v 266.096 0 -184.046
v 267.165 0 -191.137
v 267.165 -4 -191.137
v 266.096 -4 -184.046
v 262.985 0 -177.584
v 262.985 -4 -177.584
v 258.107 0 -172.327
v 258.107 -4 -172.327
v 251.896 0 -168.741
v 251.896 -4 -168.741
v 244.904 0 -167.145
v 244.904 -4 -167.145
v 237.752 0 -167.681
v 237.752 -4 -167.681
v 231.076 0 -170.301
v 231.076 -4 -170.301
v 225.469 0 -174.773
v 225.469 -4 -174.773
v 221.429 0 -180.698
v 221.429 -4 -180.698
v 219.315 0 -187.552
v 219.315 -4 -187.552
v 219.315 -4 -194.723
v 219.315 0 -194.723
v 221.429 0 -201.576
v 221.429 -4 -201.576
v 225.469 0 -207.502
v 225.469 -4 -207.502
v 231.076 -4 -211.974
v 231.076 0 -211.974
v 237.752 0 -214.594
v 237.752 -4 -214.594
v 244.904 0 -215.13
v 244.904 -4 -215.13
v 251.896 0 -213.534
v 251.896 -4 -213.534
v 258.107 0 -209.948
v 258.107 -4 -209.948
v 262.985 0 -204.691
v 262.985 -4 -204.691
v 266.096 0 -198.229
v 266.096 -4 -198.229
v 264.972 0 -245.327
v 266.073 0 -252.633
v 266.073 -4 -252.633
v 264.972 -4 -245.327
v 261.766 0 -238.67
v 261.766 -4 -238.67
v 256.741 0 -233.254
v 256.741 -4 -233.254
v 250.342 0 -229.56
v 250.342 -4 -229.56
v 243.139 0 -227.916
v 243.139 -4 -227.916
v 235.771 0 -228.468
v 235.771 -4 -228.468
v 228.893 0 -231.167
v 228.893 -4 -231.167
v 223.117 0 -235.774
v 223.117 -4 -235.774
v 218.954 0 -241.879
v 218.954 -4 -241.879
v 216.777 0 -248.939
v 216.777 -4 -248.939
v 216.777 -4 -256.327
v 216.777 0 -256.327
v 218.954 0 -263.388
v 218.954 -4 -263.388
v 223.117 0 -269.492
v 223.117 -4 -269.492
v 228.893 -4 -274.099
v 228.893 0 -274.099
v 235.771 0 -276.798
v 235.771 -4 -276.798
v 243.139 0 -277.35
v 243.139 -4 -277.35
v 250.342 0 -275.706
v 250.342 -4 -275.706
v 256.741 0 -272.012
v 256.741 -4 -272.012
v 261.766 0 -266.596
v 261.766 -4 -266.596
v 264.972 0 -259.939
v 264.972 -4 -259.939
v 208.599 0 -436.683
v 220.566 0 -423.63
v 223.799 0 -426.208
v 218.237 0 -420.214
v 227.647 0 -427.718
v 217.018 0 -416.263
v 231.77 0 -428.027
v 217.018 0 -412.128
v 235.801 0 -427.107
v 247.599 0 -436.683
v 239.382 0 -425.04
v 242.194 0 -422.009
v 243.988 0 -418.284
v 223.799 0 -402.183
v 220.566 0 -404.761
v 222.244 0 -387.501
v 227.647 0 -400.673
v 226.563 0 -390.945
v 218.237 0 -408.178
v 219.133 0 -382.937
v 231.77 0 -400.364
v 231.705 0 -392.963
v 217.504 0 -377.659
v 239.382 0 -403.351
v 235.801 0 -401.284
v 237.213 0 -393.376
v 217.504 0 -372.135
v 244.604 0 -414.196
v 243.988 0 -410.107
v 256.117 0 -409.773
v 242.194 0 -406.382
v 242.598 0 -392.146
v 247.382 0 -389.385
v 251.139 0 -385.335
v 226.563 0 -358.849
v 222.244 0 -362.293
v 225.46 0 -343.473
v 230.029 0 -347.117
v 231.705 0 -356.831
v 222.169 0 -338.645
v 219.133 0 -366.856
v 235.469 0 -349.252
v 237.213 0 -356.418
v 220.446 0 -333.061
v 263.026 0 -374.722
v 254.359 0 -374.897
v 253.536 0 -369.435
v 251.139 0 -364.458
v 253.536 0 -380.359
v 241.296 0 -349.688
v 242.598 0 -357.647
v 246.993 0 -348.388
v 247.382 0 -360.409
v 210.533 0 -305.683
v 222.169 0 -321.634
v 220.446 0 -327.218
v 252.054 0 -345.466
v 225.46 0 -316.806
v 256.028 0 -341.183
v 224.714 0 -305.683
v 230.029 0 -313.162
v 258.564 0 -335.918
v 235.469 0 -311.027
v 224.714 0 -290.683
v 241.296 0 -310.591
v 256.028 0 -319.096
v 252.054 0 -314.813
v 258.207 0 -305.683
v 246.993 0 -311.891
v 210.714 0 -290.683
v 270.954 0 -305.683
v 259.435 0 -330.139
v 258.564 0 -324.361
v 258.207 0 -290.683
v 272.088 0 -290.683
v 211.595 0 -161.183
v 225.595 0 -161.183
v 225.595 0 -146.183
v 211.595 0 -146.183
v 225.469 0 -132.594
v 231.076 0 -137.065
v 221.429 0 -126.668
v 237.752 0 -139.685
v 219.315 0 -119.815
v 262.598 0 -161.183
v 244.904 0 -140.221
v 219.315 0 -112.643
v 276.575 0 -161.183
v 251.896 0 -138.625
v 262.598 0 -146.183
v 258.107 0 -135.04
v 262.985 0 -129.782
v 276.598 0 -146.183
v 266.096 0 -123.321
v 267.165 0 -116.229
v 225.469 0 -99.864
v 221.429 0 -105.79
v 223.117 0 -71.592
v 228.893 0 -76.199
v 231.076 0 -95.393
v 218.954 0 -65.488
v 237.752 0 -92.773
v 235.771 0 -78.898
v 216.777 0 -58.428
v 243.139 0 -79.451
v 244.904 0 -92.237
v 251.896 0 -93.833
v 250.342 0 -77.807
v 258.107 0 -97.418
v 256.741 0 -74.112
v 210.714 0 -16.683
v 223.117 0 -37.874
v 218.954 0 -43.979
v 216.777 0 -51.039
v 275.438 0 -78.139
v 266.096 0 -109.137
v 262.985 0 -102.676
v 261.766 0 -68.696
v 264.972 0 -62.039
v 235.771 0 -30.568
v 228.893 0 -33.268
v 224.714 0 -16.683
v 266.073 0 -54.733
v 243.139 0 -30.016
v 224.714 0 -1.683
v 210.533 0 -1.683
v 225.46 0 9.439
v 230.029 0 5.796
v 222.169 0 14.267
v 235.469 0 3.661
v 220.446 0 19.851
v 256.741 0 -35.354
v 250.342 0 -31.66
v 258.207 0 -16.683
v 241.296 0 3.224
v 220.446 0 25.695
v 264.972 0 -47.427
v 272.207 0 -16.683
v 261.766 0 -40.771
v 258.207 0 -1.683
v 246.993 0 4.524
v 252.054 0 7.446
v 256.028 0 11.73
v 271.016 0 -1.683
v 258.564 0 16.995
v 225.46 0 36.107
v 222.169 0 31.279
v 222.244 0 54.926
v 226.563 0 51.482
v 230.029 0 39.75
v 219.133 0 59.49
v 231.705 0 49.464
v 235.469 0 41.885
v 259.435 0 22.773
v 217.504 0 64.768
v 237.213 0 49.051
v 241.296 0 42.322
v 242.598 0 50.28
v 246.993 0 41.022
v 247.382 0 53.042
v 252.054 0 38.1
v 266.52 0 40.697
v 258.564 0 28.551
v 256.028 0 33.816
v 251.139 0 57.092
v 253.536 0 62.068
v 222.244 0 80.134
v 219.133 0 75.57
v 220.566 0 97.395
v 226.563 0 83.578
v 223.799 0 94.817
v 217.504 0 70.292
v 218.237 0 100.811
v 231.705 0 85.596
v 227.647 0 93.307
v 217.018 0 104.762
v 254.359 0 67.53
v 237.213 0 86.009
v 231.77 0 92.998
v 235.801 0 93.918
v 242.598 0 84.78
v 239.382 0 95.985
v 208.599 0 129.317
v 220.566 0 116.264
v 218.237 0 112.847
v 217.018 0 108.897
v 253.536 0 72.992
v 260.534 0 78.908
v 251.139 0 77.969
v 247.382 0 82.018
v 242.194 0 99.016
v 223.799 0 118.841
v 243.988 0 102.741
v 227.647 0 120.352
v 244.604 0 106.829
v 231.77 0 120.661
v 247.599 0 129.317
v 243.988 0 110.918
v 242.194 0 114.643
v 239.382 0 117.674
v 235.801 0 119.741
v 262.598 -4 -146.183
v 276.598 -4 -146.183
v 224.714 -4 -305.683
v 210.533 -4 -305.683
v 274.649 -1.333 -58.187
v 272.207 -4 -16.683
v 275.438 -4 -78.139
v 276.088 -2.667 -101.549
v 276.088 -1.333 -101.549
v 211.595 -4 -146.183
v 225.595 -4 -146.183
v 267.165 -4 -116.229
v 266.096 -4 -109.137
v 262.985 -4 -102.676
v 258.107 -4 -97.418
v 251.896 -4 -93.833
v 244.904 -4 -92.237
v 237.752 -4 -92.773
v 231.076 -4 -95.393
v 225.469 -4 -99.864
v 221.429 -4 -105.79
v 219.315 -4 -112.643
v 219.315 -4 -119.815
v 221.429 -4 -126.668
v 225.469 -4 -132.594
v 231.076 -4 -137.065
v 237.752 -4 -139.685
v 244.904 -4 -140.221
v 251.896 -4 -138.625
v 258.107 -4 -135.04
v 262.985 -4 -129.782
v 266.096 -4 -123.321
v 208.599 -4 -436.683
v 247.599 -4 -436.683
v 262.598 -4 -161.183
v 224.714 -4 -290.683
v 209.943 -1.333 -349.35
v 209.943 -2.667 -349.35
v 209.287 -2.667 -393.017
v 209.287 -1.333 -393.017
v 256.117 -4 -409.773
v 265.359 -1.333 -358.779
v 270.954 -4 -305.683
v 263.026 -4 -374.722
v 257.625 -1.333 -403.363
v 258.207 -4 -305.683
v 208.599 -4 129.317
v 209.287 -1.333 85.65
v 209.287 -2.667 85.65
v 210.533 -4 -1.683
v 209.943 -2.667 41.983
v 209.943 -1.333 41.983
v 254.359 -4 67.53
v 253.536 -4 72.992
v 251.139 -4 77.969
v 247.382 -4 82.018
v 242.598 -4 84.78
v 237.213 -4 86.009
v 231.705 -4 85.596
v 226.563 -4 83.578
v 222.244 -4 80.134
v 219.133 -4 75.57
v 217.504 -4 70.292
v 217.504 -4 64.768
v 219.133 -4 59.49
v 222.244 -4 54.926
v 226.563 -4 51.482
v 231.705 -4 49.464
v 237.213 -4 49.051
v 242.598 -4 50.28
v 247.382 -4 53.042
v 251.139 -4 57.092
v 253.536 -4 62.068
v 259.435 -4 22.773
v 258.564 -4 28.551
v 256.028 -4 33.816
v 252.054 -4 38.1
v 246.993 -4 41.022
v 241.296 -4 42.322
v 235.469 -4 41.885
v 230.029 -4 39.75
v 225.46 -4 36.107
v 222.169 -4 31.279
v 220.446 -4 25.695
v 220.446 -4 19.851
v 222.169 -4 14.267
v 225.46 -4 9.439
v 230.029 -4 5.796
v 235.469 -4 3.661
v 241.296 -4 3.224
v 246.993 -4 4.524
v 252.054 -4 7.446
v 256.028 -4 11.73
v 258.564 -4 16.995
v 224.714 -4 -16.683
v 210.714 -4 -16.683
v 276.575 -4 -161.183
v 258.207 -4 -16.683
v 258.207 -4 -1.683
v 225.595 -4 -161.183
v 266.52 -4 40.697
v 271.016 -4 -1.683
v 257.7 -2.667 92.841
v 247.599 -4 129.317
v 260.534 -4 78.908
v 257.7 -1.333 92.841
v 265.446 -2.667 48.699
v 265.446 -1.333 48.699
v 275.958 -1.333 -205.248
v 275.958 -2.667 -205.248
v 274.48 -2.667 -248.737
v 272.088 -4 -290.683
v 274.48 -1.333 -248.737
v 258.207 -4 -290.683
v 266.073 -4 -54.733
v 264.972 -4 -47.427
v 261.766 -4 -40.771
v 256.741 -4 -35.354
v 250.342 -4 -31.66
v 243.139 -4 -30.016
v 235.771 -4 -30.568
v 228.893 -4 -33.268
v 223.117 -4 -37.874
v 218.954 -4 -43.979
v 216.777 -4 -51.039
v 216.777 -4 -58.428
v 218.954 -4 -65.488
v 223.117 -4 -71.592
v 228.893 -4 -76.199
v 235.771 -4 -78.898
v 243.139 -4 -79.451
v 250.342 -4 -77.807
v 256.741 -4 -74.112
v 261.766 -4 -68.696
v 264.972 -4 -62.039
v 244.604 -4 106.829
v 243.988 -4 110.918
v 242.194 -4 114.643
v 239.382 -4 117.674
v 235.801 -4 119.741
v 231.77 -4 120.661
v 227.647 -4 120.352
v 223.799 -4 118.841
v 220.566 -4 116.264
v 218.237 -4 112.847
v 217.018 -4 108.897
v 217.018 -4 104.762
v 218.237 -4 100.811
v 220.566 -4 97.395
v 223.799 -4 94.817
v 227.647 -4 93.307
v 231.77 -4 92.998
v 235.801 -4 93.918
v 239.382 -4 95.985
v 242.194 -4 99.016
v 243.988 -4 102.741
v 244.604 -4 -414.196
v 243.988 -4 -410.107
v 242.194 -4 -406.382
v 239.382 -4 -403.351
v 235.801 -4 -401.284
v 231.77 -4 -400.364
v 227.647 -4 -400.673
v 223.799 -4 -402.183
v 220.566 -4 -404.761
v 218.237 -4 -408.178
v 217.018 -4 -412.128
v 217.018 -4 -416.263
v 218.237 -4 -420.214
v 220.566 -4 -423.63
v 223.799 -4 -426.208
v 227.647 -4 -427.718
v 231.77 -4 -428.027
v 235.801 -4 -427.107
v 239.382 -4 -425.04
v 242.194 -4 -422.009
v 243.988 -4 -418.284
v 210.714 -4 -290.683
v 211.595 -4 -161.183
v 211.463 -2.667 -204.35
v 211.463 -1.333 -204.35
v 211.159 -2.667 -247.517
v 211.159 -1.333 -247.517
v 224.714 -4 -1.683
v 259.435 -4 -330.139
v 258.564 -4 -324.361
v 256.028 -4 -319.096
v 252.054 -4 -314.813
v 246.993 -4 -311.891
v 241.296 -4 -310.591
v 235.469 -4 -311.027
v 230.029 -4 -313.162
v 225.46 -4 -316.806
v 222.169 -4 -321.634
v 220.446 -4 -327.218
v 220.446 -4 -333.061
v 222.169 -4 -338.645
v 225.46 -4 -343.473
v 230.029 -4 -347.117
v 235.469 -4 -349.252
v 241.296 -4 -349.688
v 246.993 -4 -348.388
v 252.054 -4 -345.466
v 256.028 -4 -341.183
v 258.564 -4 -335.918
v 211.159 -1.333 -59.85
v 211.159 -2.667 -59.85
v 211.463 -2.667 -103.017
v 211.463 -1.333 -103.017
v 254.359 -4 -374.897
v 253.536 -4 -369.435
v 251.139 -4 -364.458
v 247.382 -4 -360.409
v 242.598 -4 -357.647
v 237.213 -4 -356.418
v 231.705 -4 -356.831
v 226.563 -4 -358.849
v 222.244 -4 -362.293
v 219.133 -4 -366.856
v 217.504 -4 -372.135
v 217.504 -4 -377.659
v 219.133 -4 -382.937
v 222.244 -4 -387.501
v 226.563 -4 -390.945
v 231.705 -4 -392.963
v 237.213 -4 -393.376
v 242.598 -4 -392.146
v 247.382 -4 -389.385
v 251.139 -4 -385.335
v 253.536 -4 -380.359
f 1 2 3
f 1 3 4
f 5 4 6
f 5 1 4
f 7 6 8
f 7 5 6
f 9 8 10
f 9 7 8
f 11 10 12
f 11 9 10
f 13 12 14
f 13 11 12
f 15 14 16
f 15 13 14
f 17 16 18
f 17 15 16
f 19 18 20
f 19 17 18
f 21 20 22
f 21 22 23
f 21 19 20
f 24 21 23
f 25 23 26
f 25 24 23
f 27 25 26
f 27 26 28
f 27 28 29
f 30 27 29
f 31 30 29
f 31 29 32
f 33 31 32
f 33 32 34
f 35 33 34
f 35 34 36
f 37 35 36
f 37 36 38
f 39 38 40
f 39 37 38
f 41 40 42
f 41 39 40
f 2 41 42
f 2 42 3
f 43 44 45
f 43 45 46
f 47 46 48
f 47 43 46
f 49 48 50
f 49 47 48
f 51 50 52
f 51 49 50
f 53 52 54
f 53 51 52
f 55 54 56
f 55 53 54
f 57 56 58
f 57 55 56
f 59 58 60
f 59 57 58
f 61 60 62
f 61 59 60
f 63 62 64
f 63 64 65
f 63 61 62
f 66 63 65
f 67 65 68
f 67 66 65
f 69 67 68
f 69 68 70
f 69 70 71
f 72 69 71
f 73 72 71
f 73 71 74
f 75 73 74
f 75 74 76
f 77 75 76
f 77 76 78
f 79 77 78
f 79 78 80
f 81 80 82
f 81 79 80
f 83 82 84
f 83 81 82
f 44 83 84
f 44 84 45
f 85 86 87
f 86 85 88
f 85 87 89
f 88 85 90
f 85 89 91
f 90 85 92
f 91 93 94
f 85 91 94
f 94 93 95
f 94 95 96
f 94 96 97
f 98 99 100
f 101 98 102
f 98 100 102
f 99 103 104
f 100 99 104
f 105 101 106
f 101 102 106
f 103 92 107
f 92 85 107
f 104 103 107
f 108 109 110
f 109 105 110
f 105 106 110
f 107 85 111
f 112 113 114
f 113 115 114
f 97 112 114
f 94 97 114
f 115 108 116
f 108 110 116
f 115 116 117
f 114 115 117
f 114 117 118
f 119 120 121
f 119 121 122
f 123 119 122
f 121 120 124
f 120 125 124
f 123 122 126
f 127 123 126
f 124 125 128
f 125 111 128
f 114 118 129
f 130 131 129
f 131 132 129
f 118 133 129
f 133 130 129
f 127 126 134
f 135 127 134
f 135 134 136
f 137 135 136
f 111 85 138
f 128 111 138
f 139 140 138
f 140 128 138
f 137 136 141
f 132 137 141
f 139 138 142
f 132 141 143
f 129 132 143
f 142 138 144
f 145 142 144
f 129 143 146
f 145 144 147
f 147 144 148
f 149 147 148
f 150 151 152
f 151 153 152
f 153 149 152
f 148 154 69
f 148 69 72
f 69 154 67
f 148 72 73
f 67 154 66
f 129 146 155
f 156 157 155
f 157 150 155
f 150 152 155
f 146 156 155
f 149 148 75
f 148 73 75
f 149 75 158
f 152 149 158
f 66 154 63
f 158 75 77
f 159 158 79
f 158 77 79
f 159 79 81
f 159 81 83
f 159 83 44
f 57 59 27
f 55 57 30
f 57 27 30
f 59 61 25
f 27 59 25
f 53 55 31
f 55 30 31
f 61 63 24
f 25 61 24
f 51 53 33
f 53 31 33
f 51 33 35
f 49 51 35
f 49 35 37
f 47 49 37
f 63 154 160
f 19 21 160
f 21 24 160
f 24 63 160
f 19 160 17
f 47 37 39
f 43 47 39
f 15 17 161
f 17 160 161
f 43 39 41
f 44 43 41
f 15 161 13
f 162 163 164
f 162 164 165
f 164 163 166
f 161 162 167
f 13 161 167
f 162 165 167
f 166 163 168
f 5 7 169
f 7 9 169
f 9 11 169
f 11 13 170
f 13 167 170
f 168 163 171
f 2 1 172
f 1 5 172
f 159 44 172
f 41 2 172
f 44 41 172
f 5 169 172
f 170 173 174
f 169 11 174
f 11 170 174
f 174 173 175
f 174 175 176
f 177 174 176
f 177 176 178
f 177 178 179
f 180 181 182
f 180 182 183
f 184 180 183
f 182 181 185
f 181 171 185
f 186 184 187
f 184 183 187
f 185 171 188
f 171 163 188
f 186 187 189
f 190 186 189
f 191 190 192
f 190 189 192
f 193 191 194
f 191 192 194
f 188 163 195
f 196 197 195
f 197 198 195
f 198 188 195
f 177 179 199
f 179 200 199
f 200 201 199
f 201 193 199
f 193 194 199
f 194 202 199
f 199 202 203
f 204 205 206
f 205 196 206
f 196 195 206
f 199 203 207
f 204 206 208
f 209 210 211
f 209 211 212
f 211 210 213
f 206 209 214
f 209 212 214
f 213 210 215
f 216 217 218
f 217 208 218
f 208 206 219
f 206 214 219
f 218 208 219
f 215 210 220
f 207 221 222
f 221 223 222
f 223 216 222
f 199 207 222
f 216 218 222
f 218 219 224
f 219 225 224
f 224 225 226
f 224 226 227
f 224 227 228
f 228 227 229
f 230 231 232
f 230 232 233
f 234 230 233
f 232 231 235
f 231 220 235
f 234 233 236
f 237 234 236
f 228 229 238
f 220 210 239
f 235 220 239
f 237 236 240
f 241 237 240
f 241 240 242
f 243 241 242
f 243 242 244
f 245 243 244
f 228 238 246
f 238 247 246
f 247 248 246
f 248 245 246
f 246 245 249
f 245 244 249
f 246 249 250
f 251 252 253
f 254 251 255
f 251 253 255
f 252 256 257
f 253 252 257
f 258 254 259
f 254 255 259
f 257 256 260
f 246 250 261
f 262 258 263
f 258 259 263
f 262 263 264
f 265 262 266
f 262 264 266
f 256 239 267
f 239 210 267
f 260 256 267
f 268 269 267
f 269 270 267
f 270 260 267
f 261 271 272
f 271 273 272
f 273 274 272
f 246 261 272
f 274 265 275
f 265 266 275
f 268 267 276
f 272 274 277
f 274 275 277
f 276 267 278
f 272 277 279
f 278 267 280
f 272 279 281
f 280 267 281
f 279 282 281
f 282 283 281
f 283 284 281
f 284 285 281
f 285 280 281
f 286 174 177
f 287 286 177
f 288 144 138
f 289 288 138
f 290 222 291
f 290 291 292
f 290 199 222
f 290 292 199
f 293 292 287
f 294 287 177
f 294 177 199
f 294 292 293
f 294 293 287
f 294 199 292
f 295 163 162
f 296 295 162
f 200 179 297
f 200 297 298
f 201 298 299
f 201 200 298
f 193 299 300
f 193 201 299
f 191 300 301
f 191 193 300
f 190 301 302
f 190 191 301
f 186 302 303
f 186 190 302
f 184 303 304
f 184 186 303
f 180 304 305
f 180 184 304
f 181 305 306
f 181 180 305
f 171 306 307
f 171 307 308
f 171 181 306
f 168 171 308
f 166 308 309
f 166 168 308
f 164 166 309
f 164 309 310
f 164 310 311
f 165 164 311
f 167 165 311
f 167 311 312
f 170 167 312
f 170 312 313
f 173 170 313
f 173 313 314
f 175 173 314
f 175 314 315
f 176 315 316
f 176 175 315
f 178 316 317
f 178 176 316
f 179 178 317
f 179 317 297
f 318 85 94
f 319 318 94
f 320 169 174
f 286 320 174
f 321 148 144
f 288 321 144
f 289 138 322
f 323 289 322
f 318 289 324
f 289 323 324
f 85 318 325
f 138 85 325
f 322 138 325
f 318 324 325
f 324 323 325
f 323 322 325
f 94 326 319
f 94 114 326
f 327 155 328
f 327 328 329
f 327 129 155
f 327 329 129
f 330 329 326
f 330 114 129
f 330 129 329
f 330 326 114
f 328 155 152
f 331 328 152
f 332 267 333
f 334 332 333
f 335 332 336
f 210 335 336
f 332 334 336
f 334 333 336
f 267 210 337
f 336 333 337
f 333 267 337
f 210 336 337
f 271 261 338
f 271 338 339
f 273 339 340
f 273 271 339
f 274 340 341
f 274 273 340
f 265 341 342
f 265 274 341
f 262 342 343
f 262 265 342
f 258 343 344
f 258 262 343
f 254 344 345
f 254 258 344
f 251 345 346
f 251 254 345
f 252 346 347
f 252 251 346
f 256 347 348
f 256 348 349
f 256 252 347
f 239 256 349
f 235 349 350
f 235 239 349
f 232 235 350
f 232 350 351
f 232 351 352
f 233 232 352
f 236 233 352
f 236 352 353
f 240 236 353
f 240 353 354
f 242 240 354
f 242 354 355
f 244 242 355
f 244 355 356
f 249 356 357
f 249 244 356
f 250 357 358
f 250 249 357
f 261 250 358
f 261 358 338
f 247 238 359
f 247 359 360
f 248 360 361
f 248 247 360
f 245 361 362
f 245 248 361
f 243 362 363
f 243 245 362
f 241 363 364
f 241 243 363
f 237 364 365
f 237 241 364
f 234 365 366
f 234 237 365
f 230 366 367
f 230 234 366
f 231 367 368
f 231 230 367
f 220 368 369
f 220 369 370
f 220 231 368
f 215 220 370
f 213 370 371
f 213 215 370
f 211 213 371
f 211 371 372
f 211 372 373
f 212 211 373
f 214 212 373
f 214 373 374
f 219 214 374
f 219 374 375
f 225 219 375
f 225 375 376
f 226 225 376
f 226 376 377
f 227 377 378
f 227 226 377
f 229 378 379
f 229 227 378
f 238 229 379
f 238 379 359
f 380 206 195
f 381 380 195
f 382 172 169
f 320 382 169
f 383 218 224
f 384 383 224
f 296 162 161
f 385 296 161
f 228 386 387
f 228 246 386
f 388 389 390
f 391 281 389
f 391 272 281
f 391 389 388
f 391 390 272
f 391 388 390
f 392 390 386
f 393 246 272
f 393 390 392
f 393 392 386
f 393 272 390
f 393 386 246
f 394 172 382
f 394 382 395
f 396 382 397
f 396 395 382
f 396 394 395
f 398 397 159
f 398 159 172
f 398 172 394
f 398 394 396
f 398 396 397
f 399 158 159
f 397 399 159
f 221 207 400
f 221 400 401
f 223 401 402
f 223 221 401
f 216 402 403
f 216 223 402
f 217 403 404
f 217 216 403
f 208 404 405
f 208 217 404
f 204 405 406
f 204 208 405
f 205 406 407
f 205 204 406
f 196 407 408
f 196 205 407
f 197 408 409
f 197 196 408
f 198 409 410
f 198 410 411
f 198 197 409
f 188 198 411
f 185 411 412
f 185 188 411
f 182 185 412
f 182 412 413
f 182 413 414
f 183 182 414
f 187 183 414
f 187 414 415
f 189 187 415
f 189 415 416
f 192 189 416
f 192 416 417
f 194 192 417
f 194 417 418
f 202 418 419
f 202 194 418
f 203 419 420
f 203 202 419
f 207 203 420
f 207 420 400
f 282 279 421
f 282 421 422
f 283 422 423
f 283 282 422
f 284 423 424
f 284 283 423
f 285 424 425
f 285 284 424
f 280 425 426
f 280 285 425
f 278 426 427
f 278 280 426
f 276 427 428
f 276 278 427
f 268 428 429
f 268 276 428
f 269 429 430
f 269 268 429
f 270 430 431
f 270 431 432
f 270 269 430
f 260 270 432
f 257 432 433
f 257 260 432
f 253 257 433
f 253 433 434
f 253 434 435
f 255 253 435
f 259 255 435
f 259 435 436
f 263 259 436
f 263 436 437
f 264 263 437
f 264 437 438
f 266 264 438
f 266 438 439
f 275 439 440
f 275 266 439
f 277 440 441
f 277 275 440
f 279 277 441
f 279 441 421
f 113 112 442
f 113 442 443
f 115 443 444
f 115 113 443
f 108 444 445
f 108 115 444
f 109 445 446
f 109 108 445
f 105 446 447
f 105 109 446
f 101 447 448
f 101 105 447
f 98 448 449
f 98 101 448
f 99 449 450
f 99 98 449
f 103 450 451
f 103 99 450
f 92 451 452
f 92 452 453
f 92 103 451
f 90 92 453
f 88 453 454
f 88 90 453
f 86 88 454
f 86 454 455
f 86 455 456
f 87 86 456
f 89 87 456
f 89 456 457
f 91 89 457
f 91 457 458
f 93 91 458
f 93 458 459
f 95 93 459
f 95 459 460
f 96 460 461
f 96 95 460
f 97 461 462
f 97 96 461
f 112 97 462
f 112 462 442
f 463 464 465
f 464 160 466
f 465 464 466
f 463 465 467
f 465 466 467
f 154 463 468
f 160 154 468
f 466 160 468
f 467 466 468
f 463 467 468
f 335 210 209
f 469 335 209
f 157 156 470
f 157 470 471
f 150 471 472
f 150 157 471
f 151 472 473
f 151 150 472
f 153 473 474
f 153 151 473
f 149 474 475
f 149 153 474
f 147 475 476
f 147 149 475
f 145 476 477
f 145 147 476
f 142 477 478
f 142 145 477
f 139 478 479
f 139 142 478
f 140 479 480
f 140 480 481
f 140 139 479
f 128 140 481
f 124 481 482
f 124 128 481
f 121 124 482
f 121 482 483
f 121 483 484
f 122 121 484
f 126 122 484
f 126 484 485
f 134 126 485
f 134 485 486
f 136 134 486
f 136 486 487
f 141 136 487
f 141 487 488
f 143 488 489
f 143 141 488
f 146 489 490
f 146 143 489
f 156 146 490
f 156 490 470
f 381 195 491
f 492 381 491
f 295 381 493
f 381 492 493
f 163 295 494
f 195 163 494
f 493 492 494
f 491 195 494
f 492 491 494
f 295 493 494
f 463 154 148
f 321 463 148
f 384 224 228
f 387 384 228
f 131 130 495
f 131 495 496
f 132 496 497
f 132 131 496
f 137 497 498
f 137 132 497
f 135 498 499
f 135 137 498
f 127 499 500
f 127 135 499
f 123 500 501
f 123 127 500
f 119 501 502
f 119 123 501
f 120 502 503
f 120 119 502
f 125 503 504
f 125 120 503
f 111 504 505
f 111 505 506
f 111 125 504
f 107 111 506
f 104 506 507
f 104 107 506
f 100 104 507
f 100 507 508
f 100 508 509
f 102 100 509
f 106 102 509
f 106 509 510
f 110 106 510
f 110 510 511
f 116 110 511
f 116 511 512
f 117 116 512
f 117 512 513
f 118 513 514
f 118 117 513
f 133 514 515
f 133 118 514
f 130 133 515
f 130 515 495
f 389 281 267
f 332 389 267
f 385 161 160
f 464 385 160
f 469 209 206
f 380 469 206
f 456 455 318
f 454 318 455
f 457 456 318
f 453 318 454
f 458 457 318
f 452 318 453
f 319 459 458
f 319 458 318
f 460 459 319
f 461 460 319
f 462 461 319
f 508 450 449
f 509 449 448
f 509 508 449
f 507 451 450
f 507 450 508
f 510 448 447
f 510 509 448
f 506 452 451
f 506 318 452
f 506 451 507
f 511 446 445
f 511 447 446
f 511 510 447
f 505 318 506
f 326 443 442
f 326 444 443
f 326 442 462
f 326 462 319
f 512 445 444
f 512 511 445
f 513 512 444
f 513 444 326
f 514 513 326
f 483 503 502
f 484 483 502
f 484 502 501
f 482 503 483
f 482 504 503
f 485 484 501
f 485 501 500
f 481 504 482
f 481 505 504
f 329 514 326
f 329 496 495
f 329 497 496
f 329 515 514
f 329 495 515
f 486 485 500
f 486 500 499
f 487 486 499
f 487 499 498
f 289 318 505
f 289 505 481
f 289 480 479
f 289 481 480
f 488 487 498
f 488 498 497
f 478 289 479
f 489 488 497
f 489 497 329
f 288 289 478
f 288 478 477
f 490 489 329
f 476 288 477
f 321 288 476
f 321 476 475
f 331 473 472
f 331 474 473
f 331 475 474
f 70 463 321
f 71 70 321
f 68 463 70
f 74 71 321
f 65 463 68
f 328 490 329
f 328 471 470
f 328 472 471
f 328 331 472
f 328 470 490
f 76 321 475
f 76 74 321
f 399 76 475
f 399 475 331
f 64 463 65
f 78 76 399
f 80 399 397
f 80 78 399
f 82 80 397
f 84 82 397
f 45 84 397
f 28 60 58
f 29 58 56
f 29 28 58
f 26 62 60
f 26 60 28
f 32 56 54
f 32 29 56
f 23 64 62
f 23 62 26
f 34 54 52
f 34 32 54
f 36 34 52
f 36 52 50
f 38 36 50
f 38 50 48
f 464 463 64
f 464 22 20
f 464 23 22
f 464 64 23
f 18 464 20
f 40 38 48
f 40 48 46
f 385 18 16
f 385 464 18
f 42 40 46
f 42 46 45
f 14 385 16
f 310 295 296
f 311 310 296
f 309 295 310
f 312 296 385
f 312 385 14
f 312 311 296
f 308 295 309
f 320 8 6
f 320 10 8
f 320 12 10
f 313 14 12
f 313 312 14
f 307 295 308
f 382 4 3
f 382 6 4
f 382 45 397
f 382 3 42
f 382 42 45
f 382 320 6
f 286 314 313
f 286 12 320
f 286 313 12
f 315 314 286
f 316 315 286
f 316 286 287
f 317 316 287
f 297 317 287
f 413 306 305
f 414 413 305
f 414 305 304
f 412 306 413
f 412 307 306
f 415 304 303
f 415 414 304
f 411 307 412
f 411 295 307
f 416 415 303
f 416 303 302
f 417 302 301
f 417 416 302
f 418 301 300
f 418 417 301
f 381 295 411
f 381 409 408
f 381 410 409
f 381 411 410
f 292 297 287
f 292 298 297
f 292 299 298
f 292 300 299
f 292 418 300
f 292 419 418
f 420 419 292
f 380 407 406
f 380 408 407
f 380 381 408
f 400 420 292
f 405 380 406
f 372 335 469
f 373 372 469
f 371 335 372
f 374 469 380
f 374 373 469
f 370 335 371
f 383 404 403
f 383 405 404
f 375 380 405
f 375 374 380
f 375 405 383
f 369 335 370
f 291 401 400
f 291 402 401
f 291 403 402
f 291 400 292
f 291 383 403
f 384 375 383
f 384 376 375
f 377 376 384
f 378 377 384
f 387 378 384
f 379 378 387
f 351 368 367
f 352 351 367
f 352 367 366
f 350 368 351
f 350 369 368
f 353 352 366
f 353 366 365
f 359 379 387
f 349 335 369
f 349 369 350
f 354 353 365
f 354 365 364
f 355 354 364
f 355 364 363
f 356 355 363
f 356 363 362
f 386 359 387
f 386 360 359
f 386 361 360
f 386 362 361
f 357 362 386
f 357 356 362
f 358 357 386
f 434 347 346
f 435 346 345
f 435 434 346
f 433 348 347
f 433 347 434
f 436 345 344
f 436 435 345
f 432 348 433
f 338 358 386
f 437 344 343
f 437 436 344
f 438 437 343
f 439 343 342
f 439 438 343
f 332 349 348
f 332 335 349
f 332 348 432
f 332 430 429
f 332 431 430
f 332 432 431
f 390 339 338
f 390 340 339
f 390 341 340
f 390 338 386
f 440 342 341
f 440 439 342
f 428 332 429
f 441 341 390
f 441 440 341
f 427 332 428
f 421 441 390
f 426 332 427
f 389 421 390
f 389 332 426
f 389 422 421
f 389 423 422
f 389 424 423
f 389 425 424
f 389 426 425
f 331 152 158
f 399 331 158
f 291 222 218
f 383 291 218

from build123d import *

# Parameters (mm, degrees)
F0_R     = 19.603688
F0_R_2   = 13.870468
F0_R_3   = 18.530739
F0_R_4   = 24.78659
F0_R_5   = 24.059578
F1_DEPTH = 4


with BuildPart() as f1:
    # F0 (on Front) → F1 (new body)
    with BuildSketch(Plane.XZ):
        with BuildLine():
            Line((247.598545, 129.316792), (218.598545, 129.316792))
            Line((218.598545, 129.316792), (208.598545, 129.316792))
            add(Edge.make_bspline(
                [(208.598545, 129.316792), (209.292892, 85.650126), (209.987238, 41.983459), (210.532804, -1.683208)],
                knots=[0, 0, 0, 0, 131.00736, 131.00736, 131.00736, 131.00736], degree=3))
            Line((210.532804, -1.683208), (224.714136, -1.683208))
            Line((224.714136, -1.683208), (224.714136, -9.183208))
            Line((224.714136, -9.183208), (258.207463, -9.183208))
            Line((258.207463, -9.183208), (258.207463, -1.683208))
            Line((258.207463, -1.683208), (271.015688, -1.683208))
            add(Edge.make_bspline(
                [(247.598545, 129.316792), (258.936994, 97.14756), (266.473841, 51.345555), (271.015688, -1.683208)],
                knots=[0, 0, 0, 0, 151.505652, 151.505652, 151.505652, 151.505652], degree=3))
        make_face()
        with Locations((239.830866, 22.773052)):
            Circle(F0_R, mode=Mode.SUBTRACT)
        with Locations((230.733871, 106.829256)):
            Circle(F0_R_2, mode=Mode.SUBTRACT)
        with Locations((235.828176, 67.530252)):
            Circle(F0_R_3, mode=Mode.SUBTRACT)
        with BuildLine():
            Line((258.207463, -16.683208), (258.207463, -9.183208))
            Line((258.207463, -9.183208), (224.714136, -9.183208))
            Line((224.714136, -9.183208), (224.714136, -16.683208))
            Line((224.714136, -16.683208), (210.714136, -16.683208))
            add(Edge.make_bspline(
                [(210.714136, -16.683208), (211.217845, -59.849874), (211.559513, -103.016541), (211.595413, -146.183208)],
                knots=[146.008203, 146.008203, 146.008203, 146.008203, 275.515479, 275.515479, 275.515479, 275.515479], degree=3))
            Line((211.595413, -146.183208), (225.595413, -146.183208))
            Line((225.595413, -146.183208), (225.595413, -153.683208))
            Line((225.595413, -153.683208), (262.598491, -153.683208))
            Line((262.598491, -153.683208), (262.598491, -146.183208))
            Line((262.598491, -146.183208), (276.598491, -146.183208))
            add(Edge.make_bspline(
                [(272.207463, -16.683208), (275.174253, -57.063181), (276.527478, -101.107051), (276.598491, -146.183208)],
                knots=[165.616704, 165.616704, 165.616704, 165.616704, 278.243078, 278.243078, 278.243078, 278.243078], degree=3))
            Line((272.207463, -16.683208), (258.207463, -16.683208))
        make_face()
        with Locations((241.286382, -54.733325)):
            Circle(F0_R_4, mode=Mode.SUBTRACT)
        with Locations((243.105769, -116.228998)):
            Circle(F0_R_5, mode=Mode.SUBTRACT)
        with BuildLine():
            add(Edge.make_bspline(
                [(210.532804, -305.683208), (209.987238, -349.349874), (209.292892, -393.016541), (208.598545, -436.683208)],
                knots=[435.024441, 435.024441, 435.024441, 435.024441, 566.031801, 566.031801, 566.031801, 566.031801], degree=3))
            Line((208.598545, -436.683208), (218.598545, -436.683208))
            Line((218.598545, -436.683208), (247.598545, -436.683208))
            add(Edge.make_bspline(
                [(270.954375, -305.683208), (266.376933, -362.117906), (258.822956, -409.911712), (247.598545, -436.683208)],
                knots=[413.826682, 413.826682, 413.826682, 413.826682, 568.963971, 568.963971, 568.963971, 568.963971], degree=3))
            Line((270.954375, -305.683208), (258.207463, -305.683208))
            Line((258.207463, -305.683208), (258.207463, -298.183208))
            Line((258.207463, -298.183208), (258.207463, -290.683208))
            Line((258.207463, -290.683208), (272.08775, -290.683208))
            add(Edge.make_bspline(
                [(276.575303, -161.183208), (276.370496, -205.212088), (274.956086, -249.83193), (272.08775, -290.683208)],
                knots=[290.707653, 290.707653, 290.707653, 290.707653, 400.255998, 400.255998, 400.255998, 400.255998], degree=3))
            Line((276.575303, -161.183208), (262.598491, -161.183208))
            Line((262.598491, -161.183208), (262.598491, -153.683208))
            Line((262.598491, -153.683208), (225.595413, -153.683208))
            Line((225.595413, -153.683208), (225.595413, -161.183208))
            Line((225.595413, -161.183208), (211.595413, -161.183208))
            add(Edge.make_bspline(
                [(211.595413, -161.183208), (211.559513, -204.349874), (211.217845, -247.516541), (210.714136, -290.683208)],
                knots=[290.516322, 290.516322, 290.516322, 290.516322, 420.023598, 420.023598, 420.023598, 420.023598], degree=3))
            Line((210.714136, -290.683208), (224.714136, -290.683208))
            Line((224.714136, -290.683208), (224.714136, -305.683208))
            Line((224.714136, -305.683208), (210.532804, -305.683208))
        make_face()
        with Locations((230.733871, -414.195671)):
            Circle(F0_R_2, mode=Mode.SUBTRACT)
        with Locations((235.828176, -374.896667)):
            Circle(F0_R_3, mode=Mode.SUBTRACT)
        with Locations((239.830866, -330.139467)):
            Circle(F0_R, mode=Mode.SUBTRACT)
        with Locations((241.286382, -252.633091)):
            Circle(F0_R_4, mode=Mode.SUBTRACT)
        with Locations((243.105769, -191.137418)):
            Circle(F0_R_5, mode=Mode.SUBTRACT)
    extrude(amount=F1_DEPTH)


solid = f1.part
